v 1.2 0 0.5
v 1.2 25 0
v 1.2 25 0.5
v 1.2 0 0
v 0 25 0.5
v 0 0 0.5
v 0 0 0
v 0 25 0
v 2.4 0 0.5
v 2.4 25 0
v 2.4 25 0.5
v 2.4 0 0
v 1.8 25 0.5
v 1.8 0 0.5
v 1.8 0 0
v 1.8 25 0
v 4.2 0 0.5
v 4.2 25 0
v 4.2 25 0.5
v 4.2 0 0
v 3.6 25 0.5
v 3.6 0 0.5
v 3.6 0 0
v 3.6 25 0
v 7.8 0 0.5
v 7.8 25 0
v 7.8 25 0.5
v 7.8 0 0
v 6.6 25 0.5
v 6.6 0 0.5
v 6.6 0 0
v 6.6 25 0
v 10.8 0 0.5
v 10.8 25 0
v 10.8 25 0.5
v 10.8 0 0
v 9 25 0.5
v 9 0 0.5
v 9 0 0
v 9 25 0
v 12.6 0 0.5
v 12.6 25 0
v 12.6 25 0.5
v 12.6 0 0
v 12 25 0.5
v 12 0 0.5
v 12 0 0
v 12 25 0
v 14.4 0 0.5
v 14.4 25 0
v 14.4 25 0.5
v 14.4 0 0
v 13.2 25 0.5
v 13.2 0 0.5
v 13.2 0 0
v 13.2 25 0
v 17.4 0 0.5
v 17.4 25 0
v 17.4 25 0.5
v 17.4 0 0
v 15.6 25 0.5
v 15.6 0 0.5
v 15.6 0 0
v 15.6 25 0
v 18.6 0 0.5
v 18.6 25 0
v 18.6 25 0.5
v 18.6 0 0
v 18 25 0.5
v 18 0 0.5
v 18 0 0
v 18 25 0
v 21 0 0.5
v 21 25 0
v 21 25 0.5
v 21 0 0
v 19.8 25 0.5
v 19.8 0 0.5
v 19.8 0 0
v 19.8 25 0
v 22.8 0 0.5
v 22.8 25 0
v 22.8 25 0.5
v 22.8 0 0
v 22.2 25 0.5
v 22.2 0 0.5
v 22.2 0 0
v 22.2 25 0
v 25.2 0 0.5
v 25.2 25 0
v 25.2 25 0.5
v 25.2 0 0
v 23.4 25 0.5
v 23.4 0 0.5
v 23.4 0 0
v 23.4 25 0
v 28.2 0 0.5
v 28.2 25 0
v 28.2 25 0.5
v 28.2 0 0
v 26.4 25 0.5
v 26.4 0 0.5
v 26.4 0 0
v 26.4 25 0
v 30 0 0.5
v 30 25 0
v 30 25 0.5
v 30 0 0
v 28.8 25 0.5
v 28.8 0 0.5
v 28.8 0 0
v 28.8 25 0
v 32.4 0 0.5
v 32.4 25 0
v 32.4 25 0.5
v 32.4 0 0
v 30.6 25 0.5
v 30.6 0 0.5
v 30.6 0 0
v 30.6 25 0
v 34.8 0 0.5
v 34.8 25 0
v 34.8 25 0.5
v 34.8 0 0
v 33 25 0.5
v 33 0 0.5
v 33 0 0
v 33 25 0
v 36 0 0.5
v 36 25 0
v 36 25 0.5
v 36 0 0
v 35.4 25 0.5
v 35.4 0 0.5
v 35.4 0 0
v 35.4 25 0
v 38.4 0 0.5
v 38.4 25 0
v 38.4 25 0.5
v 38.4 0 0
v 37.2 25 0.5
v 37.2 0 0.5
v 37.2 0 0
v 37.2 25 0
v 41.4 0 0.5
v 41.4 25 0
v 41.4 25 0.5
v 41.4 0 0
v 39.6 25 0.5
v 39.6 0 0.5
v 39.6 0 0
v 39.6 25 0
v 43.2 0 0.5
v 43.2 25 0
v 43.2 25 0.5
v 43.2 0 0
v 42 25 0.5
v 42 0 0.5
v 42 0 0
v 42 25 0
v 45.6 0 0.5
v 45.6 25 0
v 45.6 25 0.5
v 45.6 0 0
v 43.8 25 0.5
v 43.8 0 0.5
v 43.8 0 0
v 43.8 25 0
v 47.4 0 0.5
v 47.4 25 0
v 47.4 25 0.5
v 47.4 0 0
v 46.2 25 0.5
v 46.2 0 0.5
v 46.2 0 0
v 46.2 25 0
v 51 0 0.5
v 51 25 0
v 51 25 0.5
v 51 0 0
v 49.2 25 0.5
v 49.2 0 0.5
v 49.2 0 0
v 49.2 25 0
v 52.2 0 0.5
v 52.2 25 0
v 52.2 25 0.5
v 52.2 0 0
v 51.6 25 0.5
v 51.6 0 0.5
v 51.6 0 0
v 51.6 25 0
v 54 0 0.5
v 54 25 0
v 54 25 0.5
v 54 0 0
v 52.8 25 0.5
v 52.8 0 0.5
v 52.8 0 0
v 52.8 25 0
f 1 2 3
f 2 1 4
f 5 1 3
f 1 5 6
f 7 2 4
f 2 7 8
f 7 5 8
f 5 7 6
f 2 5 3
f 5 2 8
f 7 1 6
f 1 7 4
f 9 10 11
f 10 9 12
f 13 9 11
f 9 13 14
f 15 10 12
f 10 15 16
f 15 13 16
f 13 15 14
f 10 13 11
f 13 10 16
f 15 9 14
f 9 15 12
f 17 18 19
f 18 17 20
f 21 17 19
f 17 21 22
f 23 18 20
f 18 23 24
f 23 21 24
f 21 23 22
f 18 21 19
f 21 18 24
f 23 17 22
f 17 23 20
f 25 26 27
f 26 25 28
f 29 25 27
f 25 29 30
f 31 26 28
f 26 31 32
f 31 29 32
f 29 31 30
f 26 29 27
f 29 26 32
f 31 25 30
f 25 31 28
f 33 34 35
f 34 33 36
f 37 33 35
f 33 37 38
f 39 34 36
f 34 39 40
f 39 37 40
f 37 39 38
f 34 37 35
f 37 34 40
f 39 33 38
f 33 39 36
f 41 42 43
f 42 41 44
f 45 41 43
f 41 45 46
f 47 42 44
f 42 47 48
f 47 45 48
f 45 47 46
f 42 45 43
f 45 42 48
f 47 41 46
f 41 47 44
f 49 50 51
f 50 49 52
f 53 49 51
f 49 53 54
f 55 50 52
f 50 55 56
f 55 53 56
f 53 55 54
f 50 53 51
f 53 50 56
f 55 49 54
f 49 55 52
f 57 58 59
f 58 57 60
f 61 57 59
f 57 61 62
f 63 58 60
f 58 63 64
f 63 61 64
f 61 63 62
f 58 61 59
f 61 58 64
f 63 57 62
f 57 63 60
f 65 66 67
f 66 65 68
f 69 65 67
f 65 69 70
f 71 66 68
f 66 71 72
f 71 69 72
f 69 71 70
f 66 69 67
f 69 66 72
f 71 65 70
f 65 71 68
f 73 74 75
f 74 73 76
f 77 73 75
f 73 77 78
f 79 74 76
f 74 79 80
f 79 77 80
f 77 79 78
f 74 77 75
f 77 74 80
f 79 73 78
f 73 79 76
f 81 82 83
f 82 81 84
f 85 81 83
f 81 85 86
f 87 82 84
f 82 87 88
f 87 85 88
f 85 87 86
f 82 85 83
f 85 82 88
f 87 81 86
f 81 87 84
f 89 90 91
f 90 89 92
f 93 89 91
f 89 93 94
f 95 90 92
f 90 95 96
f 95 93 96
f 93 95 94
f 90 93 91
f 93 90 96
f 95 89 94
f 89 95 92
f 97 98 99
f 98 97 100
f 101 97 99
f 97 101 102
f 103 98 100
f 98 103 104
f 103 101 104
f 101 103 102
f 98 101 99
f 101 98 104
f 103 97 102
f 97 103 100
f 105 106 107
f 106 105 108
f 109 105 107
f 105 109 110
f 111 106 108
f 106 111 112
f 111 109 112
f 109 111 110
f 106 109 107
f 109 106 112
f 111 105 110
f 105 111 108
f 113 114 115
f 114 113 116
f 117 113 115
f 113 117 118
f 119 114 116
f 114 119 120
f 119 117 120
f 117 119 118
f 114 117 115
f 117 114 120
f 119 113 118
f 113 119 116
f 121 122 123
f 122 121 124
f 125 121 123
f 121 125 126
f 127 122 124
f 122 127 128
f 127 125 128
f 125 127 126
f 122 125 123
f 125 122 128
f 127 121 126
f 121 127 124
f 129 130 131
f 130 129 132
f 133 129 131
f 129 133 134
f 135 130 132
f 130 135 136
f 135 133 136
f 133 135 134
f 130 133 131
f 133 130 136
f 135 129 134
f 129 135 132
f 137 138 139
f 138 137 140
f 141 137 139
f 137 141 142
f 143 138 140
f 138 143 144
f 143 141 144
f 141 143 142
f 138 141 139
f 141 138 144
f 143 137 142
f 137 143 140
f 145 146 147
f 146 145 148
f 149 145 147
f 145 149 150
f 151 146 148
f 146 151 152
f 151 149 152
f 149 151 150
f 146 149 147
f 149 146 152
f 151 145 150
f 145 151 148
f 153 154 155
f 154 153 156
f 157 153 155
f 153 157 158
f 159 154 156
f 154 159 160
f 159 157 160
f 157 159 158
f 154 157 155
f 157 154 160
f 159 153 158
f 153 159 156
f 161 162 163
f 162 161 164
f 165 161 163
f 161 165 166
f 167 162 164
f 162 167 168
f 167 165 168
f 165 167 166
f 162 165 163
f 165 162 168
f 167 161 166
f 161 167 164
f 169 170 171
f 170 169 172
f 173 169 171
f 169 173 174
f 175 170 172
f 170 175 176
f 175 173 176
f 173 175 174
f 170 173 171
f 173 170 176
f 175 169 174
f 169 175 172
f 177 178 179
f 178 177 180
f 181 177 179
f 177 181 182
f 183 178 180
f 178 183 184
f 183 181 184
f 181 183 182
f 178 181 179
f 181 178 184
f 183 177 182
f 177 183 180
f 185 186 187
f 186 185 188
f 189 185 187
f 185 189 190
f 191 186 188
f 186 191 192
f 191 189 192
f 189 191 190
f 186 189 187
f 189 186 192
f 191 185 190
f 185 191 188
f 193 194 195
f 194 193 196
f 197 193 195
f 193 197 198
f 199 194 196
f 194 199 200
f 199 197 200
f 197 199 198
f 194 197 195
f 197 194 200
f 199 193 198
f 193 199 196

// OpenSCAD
UNIT = 0.6;
BAR_LENGTH = 25.0;
BAR_DEPTH = 0.5;

modules = [2, 1, 1, 2, 1, 4, 2, 2, 3, 2, 1, 1, 2, 2, 3, 1, 1, 2, 2, 2, 1, 1, 3, 2, 3, 1, 2, 1, 3, 1, 3, 1, 1, 2, 2, 2, 3, 1, 2, 1, 3, 1, 2, 3, 3, 1, 1, 1, 2];

function prefix_sum(arr, i) =
    (i <= 0) ? 0 : arr[i-1] + prefix_sum(arr, i-1);

for (i = [0 : len(modules)-1]) {
    w = modules[i] * UNIT;
    x = prefix_sum(modules, i) * UNIT;

    if (i % 2 == 0) {
        translate([x, 0, 0])
            cube([w, BAR_LENGTH, BAR_DEPTH], center=false);
    }
}
